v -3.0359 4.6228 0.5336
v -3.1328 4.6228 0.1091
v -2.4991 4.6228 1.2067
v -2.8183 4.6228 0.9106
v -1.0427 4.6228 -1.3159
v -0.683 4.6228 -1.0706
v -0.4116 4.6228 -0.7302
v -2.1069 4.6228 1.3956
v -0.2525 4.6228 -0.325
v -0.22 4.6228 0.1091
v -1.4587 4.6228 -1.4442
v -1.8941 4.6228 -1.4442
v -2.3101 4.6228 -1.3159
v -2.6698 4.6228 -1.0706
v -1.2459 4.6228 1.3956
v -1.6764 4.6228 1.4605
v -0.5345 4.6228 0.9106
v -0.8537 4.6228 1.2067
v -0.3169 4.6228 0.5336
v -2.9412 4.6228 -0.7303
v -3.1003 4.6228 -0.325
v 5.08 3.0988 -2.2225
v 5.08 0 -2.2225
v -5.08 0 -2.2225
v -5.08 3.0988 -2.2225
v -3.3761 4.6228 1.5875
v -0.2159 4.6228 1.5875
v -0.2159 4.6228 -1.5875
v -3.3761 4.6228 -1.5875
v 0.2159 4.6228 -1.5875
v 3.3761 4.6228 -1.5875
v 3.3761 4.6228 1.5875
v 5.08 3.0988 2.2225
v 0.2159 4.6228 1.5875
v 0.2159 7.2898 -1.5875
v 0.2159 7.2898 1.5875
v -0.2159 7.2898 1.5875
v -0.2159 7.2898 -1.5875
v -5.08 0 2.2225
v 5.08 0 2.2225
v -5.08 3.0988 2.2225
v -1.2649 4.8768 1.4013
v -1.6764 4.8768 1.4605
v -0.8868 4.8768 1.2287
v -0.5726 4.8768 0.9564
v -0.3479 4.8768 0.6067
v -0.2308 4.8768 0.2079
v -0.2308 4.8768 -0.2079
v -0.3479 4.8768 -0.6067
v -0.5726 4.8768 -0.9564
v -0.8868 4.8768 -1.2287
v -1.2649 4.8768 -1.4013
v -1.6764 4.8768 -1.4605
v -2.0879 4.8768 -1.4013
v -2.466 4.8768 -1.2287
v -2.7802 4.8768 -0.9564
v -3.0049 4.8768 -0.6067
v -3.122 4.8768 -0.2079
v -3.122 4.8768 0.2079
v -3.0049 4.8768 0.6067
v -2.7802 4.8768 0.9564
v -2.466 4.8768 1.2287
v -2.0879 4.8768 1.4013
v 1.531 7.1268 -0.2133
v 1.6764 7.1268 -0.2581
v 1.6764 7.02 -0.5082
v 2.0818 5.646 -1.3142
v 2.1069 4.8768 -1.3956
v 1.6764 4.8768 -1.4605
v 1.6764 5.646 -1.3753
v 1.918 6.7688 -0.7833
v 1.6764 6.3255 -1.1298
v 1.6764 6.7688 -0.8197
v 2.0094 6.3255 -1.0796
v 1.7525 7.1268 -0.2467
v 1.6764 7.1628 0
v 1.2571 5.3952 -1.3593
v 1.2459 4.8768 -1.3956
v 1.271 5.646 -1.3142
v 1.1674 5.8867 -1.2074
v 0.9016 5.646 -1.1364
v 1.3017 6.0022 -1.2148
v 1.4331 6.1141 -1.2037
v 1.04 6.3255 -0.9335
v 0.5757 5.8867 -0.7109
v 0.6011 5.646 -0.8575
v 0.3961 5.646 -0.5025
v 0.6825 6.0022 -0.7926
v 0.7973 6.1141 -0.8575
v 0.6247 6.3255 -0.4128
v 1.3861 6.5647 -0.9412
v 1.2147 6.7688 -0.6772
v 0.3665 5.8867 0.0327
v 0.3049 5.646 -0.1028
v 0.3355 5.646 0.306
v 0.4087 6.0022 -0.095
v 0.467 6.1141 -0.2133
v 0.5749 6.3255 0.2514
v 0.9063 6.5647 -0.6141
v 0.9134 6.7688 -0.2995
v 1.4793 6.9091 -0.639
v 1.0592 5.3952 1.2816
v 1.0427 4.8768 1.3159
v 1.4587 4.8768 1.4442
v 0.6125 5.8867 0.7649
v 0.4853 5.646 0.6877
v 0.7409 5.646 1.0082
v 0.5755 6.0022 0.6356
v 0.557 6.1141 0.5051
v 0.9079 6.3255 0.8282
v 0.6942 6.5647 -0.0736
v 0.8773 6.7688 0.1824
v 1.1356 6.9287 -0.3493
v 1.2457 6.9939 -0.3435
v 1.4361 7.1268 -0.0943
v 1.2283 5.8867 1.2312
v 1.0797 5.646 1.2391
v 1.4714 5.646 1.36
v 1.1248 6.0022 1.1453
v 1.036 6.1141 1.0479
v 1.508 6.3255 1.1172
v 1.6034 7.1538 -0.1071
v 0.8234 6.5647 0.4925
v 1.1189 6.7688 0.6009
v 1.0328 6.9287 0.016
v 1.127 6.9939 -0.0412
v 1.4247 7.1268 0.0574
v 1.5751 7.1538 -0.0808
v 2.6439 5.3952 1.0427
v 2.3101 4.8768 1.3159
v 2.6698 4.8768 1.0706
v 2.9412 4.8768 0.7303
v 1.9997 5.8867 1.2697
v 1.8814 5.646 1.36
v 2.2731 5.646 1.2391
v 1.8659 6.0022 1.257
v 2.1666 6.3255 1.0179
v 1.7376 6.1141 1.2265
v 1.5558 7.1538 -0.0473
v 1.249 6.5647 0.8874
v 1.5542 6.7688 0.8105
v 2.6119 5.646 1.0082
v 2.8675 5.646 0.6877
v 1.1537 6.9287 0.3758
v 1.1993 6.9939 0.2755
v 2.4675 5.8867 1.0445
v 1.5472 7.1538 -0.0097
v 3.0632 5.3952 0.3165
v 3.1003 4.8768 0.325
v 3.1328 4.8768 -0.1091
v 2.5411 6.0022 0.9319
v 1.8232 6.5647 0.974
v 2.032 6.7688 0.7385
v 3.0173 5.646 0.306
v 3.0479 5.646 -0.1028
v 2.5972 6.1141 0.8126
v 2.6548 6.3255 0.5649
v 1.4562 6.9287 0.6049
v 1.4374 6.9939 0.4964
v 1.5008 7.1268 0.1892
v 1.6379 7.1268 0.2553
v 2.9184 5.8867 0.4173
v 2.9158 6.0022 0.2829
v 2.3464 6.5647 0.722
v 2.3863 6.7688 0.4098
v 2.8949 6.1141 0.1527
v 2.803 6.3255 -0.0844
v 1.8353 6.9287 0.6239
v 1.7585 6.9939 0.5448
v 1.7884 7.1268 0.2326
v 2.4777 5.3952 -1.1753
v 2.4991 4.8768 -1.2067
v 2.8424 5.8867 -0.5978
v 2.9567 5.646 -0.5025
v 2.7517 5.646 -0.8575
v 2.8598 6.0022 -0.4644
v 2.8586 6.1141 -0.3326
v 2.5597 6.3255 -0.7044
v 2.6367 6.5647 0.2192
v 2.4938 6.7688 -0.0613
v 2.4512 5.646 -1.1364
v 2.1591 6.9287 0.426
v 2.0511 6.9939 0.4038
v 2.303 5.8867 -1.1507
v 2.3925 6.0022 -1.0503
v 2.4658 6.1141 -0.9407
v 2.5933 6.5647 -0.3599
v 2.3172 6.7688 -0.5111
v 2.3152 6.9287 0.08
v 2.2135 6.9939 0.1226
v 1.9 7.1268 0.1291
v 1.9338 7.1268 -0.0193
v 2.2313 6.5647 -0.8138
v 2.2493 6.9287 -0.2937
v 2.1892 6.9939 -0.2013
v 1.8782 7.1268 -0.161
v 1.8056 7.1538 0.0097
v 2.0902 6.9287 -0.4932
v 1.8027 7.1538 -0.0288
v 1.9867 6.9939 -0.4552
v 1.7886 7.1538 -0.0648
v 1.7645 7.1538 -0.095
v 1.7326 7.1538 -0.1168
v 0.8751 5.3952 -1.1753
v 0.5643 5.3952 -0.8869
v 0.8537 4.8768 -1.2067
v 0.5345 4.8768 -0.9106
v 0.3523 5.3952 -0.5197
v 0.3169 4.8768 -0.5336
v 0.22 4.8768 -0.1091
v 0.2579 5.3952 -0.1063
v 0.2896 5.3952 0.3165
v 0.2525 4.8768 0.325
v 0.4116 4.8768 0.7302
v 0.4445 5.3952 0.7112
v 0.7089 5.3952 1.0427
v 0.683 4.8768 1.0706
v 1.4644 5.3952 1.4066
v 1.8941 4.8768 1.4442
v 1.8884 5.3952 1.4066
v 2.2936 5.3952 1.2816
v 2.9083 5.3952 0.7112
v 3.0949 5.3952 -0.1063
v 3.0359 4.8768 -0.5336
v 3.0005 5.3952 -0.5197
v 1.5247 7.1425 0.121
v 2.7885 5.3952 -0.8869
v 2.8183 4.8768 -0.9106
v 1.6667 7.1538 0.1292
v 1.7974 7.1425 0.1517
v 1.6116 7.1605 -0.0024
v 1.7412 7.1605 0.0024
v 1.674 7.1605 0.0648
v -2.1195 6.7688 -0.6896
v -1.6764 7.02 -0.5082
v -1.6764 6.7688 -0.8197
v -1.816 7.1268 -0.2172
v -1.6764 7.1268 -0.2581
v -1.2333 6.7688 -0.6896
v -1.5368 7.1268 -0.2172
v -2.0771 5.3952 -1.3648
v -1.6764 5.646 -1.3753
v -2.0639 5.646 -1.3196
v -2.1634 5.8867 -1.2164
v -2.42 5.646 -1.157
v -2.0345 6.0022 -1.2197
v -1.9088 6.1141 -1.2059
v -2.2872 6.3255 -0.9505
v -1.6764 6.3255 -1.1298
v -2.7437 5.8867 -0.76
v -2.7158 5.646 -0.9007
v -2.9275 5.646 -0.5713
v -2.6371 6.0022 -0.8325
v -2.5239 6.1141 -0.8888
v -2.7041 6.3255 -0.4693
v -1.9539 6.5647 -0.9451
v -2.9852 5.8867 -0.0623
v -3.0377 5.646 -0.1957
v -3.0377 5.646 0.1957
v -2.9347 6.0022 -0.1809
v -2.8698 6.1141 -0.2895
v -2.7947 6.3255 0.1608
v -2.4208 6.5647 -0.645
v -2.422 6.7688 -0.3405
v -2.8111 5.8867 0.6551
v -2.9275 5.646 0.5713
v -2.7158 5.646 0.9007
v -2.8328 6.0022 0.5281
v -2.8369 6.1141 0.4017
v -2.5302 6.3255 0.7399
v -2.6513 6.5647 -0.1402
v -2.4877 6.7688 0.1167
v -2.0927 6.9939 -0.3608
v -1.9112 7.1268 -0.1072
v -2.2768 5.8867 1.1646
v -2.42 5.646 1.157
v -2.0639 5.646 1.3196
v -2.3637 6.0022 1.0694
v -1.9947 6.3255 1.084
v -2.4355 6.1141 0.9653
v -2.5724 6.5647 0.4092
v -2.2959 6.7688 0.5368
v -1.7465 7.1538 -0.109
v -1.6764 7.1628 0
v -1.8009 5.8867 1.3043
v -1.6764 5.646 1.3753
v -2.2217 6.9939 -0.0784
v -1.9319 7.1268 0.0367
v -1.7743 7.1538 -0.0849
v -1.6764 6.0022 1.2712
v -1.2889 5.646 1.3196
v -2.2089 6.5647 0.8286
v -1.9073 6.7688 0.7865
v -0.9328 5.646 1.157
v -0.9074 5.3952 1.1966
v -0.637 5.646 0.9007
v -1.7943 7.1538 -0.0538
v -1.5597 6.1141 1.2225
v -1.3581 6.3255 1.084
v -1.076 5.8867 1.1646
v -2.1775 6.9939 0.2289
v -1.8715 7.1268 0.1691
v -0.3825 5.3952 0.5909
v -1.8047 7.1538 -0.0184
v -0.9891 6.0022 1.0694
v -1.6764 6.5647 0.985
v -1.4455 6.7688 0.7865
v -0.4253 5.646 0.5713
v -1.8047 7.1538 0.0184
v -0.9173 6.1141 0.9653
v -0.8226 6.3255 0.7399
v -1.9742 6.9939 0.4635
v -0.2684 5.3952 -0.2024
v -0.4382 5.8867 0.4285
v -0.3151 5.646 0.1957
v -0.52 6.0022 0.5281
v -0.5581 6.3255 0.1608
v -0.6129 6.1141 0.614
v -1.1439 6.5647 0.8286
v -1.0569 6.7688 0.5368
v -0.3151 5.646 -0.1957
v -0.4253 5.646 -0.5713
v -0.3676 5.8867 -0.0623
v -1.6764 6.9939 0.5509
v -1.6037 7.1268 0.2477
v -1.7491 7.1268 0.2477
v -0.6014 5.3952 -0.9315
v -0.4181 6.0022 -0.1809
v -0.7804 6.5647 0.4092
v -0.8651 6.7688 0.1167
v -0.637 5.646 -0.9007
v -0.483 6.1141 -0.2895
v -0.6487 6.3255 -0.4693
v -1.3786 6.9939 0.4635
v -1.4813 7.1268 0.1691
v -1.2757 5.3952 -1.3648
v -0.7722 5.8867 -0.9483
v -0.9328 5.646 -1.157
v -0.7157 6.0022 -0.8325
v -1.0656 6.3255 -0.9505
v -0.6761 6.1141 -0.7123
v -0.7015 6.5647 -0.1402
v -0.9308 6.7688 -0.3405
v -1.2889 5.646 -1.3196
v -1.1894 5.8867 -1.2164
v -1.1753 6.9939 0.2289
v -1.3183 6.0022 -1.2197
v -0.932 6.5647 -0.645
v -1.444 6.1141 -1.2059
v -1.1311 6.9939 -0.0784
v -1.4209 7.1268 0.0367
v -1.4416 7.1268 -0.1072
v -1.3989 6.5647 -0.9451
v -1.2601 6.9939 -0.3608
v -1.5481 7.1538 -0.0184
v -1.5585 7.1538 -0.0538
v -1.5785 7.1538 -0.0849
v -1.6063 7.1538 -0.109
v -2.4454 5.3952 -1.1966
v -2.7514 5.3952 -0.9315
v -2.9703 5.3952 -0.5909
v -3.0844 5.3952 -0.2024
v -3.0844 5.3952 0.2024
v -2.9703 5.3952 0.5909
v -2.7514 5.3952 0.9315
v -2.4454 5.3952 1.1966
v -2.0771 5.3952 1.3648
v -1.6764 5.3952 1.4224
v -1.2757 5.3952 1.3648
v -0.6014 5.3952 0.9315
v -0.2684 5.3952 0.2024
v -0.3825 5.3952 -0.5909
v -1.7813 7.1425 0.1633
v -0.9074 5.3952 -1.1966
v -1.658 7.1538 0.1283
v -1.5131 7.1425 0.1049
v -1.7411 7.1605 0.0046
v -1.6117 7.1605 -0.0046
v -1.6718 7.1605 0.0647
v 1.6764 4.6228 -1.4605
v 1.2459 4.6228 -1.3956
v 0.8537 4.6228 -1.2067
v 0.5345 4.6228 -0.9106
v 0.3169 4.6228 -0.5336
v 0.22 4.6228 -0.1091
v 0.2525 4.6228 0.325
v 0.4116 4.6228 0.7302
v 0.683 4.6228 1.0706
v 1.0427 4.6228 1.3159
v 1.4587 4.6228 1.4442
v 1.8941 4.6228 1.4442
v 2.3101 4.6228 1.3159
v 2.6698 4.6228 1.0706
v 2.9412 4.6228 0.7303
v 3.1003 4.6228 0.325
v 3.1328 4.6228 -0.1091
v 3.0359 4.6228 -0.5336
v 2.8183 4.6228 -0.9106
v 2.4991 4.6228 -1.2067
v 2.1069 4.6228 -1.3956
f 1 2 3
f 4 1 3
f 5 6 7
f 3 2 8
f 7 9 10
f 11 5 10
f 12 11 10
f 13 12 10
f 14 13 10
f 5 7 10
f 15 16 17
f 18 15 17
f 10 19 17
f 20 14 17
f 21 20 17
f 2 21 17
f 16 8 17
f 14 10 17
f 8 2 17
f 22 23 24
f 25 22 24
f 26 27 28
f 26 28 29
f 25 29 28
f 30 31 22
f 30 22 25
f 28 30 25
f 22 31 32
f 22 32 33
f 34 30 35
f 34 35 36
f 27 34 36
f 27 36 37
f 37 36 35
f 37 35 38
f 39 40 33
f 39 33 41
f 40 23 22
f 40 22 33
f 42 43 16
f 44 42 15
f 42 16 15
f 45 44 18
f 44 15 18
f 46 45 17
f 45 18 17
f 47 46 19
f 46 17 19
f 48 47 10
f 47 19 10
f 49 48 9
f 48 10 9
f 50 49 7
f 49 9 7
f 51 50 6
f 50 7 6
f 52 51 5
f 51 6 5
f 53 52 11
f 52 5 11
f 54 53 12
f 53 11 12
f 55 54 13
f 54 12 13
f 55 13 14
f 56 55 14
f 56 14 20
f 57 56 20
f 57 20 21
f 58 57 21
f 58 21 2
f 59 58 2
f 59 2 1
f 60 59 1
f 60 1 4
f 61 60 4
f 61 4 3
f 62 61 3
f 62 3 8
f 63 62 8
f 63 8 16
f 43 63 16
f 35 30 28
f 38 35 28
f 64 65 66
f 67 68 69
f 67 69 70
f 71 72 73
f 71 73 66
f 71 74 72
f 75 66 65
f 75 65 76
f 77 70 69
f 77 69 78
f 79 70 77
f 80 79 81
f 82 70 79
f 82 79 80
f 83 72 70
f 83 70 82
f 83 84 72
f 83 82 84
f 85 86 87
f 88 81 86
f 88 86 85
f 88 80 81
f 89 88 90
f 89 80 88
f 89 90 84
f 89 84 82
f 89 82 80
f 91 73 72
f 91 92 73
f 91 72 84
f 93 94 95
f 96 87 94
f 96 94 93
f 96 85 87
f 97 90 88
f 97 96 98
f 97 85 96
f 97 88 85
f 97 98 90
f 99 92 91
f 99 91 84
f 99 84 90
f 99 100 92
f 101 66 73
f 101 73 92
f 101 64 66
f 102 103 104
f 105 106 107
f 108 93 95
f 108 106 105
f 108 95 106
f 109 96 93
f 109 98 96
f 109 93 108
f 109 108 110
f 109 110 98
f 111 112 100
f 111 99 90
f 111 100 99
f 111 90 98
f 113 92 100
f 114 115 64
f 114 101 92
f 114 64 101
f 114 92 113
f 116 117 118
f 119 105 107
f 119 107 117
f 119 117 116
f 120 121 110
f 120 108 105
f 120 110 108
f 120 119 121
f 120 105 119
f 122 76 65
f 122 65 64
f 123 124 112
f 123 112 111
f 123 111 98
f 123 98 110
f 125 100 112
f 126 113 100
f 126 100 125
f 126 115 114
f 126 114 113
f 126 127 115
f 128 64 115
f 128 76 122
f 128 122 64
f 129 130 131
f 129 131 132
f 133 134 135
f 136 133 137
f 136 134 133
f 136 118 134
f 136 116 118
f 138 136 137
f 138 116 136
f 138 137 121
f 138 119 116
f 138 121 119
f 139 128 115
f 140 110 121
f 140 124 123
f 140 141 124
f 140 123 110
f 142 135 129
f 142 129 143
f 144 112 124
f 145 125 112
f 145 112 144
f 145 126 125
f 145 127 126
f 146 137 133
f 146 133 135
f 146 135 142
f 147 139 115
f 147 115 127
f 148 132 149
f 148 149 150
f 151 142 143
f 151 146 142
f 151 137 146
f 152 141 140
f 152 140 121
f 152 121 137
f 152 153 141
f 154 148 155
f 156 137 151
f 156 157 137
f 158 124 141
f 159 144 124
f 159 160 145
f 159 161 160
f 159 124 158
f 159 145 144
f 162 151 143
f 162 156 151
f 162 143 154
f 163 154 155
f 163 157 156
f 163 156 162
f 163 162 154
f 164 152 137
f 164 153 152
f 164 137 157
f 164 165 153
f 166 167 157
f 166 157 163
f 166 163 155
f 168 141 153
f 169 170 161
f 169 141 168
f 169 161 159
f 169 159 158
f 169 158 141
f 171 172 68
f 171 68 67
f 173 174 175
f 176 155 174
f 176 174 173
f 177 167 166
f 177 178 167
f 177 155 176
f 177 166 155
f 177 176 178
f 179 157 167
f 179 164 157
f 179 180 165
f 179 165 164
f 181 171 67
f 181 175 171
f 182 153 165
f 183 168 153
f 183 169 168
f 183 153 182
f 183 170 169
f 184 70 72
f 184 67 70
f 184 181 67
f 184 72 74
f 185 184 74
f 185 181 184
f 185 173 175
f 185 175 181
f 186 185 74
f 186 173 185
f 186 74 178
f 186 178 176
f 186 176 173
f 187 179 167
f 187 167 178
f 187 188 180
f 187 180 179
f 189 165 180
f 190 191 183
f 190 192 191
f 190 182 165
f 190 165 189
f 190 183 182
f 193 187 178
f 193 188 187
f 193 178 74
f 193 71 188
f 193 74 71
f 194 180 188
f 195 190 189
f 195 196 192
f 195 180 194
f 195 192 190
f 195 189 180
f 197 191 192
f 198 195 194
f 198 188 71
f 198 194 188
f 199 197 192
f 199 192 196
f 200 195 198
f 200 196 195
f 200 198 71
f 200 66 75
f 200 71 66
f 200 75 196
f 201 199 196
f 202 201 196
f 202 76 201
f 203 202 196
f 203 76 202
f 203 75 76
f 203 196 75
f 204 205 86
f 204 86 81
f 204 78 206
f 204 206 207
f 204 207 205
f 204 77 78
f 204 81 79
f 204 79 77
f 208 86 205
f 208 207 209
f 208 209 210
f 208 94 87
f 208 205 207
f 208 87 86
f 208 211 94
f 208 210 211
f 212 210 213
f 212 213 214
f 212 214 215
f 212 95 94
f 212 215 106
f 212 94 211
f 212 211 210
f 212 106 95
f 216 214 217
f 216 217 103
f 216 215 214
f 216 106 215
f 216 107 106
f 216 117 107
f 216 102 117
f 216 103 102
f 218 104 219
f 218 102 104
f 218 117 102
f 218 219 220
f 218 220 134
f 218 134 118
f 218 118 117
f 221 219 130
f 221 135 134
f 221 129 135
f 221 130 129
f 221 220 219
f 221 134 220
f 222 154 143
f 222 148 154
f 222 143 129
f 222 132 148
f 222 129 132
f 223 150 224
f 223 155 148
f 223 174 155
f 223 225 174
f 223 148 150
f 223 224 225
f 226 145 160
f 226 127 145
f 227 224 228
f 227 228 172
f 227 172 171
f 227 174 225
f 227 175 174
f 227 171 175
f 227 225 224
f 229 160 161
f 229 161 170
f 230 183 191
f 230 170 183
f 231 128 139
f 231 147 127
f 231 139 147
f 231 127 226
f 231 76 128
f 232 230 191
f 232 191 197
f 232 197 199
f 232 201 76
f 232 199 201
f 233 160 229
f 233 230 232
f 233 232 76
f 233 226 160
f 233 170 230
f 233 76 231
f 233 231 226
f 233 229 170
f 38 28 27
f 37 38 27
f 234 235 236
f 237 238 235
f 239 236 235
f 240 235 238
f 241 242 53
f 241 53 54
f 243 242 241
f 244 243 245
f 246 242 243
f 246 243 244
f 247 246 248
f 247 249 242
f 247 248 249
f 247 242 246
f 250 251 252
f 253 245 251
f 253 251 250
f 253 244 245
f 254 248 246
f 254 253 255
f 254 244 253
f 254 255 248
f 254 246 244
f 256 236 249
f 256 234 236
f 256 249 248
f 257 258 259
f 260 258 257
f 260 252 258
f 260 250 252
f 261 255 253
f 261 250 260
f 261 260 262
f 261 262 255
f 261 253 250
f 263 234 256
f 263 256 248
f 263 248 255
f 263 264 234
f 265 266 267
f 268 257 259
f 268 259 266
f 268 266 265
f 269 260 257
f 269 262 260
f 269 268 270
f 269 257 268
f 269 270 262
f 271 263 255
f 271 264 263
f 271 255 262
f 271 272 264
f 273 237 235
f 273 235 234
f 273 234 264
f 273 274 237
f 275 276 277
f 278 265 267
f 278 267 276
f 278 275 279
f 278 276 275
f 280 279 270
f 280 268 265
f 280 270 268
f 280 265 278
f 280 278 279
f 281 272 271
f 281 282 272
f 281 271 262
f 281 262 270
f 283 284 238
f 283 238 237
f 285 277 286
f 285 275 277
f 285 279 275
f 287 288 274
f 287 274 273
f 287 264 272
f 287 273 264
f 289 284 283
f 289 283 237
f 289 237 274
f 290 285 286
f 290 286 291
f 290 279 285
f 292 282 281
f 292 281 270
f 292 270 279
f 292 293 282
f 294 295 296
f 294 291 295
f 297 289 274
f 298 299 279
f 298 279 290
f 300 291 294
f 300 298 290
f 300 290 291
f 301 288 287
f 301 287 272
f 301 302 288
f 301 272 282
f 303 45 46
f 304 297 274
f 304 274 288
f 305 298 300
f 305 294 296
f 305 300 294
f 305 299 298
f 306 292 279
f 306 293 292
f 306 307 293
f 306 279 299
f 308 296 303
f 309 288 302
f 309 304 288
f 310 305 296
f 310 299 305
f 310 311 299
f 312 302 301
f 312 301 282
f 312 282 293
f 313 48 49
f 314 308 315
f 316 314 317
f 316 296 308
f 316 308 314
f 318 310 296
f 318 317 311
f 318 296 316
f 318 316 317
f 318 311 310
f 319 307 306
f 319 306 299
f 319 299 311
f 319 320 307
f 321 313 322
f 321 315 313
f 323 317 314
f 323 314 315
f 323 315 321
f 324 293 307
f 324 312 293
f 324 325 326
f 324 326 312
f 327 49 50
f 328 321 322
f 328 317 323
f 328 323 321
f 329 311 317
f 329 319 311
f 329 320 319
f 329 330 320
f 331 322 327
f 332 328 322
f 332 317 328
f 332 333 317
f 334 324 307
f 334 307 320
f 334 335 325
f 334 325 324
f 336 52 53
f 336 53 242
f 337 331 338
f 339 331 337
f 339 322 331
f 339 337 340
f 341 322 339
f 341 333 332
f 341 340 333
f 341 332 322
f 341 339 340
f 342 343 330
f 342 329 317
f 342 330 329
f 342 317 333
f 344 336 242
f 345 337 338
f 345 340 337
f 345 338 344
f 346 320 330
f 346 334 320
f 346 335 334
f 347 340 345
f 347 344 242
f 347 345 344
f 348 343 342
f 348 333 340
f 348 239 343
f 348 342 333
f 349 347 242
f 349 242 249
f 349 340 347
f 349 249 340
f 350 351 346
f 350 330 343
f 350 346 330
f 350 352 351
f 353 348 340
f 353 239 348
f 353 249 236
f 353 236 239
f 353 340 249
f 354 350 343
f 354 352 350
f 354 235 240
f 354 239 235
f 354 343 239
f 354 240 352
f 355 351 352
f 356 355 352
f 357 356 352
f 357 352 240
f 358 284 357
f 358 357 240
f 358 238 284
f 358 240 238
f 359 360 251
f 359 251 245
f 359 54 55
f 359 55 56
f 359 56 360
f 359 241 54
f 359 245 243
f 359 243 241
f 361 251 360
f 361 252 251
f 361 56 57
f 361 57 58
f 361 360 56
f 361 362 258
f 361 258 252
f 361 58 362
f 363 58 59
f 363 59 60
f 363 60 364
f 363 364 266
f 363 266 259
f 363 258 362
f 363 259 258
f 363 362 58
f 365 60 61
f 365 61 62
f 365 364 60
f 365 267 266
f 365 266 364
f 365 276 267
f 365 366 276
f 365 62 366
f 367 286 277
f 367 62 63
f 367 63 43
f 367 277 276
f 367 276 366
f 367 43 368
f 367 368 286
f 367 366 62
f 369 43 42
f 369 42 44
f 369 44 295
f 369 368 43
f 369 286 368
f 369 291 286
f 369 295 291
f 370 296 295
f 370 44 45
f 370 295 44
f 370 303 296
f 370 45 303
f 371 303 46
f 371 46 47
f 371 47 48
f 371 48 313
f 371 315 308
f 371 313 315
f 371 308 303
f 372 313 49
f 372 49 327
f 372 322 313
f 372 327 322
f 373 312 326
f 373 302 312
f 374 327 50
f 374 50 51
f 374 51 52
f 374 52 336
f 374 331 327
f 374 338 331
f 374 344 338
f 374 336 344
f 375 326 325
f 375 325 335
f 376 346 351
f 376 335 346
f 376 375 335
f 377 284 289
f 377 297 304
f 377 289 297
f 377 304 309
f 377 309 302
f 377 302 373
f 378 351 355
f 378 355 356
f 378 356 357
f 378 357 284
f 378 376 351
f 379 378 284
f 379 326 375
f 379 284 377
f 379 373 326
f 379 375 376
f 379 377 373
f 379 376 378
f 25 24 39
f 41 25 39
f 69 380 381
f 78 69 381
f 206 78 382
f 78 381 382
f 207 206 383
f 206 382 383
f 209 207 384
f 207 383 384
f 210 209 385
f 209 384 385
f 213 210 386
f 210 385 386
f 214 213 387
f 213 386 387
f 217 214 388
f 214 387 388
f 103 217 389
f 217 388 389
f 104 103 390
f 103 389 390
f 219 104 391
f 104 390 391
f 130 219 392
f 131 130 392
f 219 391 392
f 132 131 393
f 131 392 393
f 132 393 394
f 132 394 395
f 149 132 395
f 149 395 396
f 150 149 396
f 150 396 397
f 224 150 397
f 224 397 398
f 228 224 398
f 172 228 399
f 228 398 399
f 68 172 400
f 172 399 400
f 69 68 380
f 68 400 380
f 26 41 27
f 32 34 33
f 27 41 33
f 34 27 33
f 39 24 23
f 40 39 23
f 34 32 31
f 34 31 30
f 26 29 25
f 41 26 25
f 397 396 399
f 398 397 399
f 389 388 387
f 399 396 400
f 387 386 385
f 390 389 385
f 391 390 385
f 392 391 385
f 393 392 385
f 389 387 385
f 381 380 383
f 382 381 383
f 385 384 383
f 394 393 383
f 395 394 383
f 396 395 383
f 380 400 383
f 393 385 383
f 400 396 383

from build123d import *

# Parameters (mm, degrees)
SKETCH1_W             = 10.16
SKETCH1_H             = 4.445
BOSS_EXTRUDE1_DEPTH   = 3.0988
SKETCH3_W             = 10.16
SKETCH3_H             = 4.445
BOSS_EXTRUDE3_DEPTH   = 1.524
CUT_EXTRUDE1_DEPTH    = 9.181363263
CUT_EXTRUDE3_DEPTH    = 12.381361346
SKETCH9_W             = 0.4318
SKETCH9_H             = 3.175
BOSS_EXTRUDE4_DEPTH   = 2.667
SKETCH10_R            = 1.4605
BOSS_EXTRUDE6_DEPTH   = 0.254
BOSS_EXTRUDE6_2_DEPTH = 0.254
DOME2_FACE_RADIUS     = 1.4605
DOME2_HEIGHT          = 2.286
DOME3_FACE_RADIUS     = 1.4605
DOME3_HEIGHT          = 2.286


with BuildPart() as part:
    # Sketch1 → Boss-Extrude1 (new body)
    with BuildSketch(Plane(origin=(0, 0, 0), x_dir=(1, 0, 0), z_dir=(0, 1, 0))):
        Rectangle(SKETCH1_W, SKETCH1_H)
    extrude(amount=BOSS_EXTRUDE1_DEPTH)

    # Sketch3 → Boss-Extrude3 (add)
    with BuildSketch(Plane(origin=(0, 3.0988, 0), x_dir=(-1, 0, 0), z_dir=(0, 1, 0))):
        Rectangle(SKETCH3_W, SKETCH3_H)
    extrude(amount=BOSS_EXTRUDE3_DEPTH)

    # Sketch4 → Cut-Extrude1 (cut, through all)
    with BuildSketch(Plane(origin=(0, 0, -2.2225), x_dir=(-1, 0, 0), z_dir=(0, 0, -1))):
        Polygon((-3.376116201, 4.6228), (-5.08, 3.0988), (-5.08, 4.6228), align=None)
        Polygon((5.08, 4.6228), (3.376116201, 4.6228), (5.08, 3.0988), align=None)
    extrude(amount=-CUT_EXTRUDE1_DEPTH, mode=Mode.SUBTRACT)

    # Sketch8 → Cut-Extrude3 (cut, through all)
    with BuildSketch(Plane(origin=(5.08, 0, 0), x_dir=(0, 0, -1), z_dir=(1, 0, 0))):
        Polygon((2.2225, 4.6228), (1.5875, 4.6228), (2.2225, 3.0988), align=None)
        Polygon((-2.2225, 4.6228), (-2.2225, 3.0988), (-1.5875, 4.6228), align=None)
    extrude(amount=-CUT_EXTRUDE3_DEPTH, mode=Mode.SUBTRACT)

    # Sketch9 → Boss-Extrude4 (add)
    with BuildSketch(Plane(origin=(0, 4.6228, 0), x_dir=(-1, 0, 0), z_dir=(0, 1, 0))):
        Rectangle(SKETCH9_W, SKETCH9_H)
    extrude(amount=BOSS_EXTRUDE4_DEPTH)


with BuildPart() as body_2:
    # Sketch10 → Boss-Extrude6 (new body)
    with BuildSketch(Plane(origin=(0, 4.6228, 0), x_dir=(1, 0, 0), z_dir=(0, 1, 0))):
        with Locations((-1.6764, 0)):
            Circle(SKETCH10_R)
    extrude(amount=BOSS_EXTRUDE6_DEPTH)

    # Dome2: an elliptical dome of height H over a round flat face of radius A is half a spheroid: the quarter ellipse of half axes A and H revolved about the face's axis
    with BuildSketch(Plane((-1.6764, 4.8768, 0), x_dir=(0, 0, -1), z_dir=(1, 0, 0)), mode=Mode.PRIVATE) as dome2_quarter:
        Ellipse(DOME2_FACE_RADIUS, DOME2_HEIGHT)
        Rectangle(DOME2_FACE_RADIUS, DOME2_HEIGHT, align=(Align.MIN, Align.MIN), mode=Mode.INTERSECT)
    revolve(dome2_quarter.sketch, axis=Axis((-1.6764, 4.8768, 0), (0, 1, 0)))


with BuildPart() as body_3:
    # Sketch10 → Boss-Extrude6 2 (new body)
    with BuildSketch(Plane(origin=(0, 4.6228, 0), x_dir=(1, 0, 0), z_dir=(0, 1, 0))):
        with Locations((1.6764, 0)):
            Circle(SKETCH10_R)
    extrude(amount=BOSS_EXTRUDE6_2_DEPTH)

    # Dome3: an elliptical dome of height H over a round flat face of radius A is half a spheroid: the quarter ellipse of half axes A and H revolved about the face's axis
    with BuildSketch(Plane((1.6764, 4.8768, 0), x_dir=(0, 0, -1), z_dir=(1, 0, 0)), mode=Mode.PRIVATE) as dome3_quarter:
        Ellipse(DOME3_FACE_RADIUS, DOME3_HEIGHT)
        Rectangle(DOME3_FACE_RADIUS, DOME3_HEIGHT, align=(Align.MIN, Align.MIN), mode=Mode.INTERSECT)
    revolve(dome3_quarter.sketch, axis=Axis((1.6764, 4.8768, 0), (0, 1, 0)))


solid = Compound([part.part, body_2.part, body_3.part])
